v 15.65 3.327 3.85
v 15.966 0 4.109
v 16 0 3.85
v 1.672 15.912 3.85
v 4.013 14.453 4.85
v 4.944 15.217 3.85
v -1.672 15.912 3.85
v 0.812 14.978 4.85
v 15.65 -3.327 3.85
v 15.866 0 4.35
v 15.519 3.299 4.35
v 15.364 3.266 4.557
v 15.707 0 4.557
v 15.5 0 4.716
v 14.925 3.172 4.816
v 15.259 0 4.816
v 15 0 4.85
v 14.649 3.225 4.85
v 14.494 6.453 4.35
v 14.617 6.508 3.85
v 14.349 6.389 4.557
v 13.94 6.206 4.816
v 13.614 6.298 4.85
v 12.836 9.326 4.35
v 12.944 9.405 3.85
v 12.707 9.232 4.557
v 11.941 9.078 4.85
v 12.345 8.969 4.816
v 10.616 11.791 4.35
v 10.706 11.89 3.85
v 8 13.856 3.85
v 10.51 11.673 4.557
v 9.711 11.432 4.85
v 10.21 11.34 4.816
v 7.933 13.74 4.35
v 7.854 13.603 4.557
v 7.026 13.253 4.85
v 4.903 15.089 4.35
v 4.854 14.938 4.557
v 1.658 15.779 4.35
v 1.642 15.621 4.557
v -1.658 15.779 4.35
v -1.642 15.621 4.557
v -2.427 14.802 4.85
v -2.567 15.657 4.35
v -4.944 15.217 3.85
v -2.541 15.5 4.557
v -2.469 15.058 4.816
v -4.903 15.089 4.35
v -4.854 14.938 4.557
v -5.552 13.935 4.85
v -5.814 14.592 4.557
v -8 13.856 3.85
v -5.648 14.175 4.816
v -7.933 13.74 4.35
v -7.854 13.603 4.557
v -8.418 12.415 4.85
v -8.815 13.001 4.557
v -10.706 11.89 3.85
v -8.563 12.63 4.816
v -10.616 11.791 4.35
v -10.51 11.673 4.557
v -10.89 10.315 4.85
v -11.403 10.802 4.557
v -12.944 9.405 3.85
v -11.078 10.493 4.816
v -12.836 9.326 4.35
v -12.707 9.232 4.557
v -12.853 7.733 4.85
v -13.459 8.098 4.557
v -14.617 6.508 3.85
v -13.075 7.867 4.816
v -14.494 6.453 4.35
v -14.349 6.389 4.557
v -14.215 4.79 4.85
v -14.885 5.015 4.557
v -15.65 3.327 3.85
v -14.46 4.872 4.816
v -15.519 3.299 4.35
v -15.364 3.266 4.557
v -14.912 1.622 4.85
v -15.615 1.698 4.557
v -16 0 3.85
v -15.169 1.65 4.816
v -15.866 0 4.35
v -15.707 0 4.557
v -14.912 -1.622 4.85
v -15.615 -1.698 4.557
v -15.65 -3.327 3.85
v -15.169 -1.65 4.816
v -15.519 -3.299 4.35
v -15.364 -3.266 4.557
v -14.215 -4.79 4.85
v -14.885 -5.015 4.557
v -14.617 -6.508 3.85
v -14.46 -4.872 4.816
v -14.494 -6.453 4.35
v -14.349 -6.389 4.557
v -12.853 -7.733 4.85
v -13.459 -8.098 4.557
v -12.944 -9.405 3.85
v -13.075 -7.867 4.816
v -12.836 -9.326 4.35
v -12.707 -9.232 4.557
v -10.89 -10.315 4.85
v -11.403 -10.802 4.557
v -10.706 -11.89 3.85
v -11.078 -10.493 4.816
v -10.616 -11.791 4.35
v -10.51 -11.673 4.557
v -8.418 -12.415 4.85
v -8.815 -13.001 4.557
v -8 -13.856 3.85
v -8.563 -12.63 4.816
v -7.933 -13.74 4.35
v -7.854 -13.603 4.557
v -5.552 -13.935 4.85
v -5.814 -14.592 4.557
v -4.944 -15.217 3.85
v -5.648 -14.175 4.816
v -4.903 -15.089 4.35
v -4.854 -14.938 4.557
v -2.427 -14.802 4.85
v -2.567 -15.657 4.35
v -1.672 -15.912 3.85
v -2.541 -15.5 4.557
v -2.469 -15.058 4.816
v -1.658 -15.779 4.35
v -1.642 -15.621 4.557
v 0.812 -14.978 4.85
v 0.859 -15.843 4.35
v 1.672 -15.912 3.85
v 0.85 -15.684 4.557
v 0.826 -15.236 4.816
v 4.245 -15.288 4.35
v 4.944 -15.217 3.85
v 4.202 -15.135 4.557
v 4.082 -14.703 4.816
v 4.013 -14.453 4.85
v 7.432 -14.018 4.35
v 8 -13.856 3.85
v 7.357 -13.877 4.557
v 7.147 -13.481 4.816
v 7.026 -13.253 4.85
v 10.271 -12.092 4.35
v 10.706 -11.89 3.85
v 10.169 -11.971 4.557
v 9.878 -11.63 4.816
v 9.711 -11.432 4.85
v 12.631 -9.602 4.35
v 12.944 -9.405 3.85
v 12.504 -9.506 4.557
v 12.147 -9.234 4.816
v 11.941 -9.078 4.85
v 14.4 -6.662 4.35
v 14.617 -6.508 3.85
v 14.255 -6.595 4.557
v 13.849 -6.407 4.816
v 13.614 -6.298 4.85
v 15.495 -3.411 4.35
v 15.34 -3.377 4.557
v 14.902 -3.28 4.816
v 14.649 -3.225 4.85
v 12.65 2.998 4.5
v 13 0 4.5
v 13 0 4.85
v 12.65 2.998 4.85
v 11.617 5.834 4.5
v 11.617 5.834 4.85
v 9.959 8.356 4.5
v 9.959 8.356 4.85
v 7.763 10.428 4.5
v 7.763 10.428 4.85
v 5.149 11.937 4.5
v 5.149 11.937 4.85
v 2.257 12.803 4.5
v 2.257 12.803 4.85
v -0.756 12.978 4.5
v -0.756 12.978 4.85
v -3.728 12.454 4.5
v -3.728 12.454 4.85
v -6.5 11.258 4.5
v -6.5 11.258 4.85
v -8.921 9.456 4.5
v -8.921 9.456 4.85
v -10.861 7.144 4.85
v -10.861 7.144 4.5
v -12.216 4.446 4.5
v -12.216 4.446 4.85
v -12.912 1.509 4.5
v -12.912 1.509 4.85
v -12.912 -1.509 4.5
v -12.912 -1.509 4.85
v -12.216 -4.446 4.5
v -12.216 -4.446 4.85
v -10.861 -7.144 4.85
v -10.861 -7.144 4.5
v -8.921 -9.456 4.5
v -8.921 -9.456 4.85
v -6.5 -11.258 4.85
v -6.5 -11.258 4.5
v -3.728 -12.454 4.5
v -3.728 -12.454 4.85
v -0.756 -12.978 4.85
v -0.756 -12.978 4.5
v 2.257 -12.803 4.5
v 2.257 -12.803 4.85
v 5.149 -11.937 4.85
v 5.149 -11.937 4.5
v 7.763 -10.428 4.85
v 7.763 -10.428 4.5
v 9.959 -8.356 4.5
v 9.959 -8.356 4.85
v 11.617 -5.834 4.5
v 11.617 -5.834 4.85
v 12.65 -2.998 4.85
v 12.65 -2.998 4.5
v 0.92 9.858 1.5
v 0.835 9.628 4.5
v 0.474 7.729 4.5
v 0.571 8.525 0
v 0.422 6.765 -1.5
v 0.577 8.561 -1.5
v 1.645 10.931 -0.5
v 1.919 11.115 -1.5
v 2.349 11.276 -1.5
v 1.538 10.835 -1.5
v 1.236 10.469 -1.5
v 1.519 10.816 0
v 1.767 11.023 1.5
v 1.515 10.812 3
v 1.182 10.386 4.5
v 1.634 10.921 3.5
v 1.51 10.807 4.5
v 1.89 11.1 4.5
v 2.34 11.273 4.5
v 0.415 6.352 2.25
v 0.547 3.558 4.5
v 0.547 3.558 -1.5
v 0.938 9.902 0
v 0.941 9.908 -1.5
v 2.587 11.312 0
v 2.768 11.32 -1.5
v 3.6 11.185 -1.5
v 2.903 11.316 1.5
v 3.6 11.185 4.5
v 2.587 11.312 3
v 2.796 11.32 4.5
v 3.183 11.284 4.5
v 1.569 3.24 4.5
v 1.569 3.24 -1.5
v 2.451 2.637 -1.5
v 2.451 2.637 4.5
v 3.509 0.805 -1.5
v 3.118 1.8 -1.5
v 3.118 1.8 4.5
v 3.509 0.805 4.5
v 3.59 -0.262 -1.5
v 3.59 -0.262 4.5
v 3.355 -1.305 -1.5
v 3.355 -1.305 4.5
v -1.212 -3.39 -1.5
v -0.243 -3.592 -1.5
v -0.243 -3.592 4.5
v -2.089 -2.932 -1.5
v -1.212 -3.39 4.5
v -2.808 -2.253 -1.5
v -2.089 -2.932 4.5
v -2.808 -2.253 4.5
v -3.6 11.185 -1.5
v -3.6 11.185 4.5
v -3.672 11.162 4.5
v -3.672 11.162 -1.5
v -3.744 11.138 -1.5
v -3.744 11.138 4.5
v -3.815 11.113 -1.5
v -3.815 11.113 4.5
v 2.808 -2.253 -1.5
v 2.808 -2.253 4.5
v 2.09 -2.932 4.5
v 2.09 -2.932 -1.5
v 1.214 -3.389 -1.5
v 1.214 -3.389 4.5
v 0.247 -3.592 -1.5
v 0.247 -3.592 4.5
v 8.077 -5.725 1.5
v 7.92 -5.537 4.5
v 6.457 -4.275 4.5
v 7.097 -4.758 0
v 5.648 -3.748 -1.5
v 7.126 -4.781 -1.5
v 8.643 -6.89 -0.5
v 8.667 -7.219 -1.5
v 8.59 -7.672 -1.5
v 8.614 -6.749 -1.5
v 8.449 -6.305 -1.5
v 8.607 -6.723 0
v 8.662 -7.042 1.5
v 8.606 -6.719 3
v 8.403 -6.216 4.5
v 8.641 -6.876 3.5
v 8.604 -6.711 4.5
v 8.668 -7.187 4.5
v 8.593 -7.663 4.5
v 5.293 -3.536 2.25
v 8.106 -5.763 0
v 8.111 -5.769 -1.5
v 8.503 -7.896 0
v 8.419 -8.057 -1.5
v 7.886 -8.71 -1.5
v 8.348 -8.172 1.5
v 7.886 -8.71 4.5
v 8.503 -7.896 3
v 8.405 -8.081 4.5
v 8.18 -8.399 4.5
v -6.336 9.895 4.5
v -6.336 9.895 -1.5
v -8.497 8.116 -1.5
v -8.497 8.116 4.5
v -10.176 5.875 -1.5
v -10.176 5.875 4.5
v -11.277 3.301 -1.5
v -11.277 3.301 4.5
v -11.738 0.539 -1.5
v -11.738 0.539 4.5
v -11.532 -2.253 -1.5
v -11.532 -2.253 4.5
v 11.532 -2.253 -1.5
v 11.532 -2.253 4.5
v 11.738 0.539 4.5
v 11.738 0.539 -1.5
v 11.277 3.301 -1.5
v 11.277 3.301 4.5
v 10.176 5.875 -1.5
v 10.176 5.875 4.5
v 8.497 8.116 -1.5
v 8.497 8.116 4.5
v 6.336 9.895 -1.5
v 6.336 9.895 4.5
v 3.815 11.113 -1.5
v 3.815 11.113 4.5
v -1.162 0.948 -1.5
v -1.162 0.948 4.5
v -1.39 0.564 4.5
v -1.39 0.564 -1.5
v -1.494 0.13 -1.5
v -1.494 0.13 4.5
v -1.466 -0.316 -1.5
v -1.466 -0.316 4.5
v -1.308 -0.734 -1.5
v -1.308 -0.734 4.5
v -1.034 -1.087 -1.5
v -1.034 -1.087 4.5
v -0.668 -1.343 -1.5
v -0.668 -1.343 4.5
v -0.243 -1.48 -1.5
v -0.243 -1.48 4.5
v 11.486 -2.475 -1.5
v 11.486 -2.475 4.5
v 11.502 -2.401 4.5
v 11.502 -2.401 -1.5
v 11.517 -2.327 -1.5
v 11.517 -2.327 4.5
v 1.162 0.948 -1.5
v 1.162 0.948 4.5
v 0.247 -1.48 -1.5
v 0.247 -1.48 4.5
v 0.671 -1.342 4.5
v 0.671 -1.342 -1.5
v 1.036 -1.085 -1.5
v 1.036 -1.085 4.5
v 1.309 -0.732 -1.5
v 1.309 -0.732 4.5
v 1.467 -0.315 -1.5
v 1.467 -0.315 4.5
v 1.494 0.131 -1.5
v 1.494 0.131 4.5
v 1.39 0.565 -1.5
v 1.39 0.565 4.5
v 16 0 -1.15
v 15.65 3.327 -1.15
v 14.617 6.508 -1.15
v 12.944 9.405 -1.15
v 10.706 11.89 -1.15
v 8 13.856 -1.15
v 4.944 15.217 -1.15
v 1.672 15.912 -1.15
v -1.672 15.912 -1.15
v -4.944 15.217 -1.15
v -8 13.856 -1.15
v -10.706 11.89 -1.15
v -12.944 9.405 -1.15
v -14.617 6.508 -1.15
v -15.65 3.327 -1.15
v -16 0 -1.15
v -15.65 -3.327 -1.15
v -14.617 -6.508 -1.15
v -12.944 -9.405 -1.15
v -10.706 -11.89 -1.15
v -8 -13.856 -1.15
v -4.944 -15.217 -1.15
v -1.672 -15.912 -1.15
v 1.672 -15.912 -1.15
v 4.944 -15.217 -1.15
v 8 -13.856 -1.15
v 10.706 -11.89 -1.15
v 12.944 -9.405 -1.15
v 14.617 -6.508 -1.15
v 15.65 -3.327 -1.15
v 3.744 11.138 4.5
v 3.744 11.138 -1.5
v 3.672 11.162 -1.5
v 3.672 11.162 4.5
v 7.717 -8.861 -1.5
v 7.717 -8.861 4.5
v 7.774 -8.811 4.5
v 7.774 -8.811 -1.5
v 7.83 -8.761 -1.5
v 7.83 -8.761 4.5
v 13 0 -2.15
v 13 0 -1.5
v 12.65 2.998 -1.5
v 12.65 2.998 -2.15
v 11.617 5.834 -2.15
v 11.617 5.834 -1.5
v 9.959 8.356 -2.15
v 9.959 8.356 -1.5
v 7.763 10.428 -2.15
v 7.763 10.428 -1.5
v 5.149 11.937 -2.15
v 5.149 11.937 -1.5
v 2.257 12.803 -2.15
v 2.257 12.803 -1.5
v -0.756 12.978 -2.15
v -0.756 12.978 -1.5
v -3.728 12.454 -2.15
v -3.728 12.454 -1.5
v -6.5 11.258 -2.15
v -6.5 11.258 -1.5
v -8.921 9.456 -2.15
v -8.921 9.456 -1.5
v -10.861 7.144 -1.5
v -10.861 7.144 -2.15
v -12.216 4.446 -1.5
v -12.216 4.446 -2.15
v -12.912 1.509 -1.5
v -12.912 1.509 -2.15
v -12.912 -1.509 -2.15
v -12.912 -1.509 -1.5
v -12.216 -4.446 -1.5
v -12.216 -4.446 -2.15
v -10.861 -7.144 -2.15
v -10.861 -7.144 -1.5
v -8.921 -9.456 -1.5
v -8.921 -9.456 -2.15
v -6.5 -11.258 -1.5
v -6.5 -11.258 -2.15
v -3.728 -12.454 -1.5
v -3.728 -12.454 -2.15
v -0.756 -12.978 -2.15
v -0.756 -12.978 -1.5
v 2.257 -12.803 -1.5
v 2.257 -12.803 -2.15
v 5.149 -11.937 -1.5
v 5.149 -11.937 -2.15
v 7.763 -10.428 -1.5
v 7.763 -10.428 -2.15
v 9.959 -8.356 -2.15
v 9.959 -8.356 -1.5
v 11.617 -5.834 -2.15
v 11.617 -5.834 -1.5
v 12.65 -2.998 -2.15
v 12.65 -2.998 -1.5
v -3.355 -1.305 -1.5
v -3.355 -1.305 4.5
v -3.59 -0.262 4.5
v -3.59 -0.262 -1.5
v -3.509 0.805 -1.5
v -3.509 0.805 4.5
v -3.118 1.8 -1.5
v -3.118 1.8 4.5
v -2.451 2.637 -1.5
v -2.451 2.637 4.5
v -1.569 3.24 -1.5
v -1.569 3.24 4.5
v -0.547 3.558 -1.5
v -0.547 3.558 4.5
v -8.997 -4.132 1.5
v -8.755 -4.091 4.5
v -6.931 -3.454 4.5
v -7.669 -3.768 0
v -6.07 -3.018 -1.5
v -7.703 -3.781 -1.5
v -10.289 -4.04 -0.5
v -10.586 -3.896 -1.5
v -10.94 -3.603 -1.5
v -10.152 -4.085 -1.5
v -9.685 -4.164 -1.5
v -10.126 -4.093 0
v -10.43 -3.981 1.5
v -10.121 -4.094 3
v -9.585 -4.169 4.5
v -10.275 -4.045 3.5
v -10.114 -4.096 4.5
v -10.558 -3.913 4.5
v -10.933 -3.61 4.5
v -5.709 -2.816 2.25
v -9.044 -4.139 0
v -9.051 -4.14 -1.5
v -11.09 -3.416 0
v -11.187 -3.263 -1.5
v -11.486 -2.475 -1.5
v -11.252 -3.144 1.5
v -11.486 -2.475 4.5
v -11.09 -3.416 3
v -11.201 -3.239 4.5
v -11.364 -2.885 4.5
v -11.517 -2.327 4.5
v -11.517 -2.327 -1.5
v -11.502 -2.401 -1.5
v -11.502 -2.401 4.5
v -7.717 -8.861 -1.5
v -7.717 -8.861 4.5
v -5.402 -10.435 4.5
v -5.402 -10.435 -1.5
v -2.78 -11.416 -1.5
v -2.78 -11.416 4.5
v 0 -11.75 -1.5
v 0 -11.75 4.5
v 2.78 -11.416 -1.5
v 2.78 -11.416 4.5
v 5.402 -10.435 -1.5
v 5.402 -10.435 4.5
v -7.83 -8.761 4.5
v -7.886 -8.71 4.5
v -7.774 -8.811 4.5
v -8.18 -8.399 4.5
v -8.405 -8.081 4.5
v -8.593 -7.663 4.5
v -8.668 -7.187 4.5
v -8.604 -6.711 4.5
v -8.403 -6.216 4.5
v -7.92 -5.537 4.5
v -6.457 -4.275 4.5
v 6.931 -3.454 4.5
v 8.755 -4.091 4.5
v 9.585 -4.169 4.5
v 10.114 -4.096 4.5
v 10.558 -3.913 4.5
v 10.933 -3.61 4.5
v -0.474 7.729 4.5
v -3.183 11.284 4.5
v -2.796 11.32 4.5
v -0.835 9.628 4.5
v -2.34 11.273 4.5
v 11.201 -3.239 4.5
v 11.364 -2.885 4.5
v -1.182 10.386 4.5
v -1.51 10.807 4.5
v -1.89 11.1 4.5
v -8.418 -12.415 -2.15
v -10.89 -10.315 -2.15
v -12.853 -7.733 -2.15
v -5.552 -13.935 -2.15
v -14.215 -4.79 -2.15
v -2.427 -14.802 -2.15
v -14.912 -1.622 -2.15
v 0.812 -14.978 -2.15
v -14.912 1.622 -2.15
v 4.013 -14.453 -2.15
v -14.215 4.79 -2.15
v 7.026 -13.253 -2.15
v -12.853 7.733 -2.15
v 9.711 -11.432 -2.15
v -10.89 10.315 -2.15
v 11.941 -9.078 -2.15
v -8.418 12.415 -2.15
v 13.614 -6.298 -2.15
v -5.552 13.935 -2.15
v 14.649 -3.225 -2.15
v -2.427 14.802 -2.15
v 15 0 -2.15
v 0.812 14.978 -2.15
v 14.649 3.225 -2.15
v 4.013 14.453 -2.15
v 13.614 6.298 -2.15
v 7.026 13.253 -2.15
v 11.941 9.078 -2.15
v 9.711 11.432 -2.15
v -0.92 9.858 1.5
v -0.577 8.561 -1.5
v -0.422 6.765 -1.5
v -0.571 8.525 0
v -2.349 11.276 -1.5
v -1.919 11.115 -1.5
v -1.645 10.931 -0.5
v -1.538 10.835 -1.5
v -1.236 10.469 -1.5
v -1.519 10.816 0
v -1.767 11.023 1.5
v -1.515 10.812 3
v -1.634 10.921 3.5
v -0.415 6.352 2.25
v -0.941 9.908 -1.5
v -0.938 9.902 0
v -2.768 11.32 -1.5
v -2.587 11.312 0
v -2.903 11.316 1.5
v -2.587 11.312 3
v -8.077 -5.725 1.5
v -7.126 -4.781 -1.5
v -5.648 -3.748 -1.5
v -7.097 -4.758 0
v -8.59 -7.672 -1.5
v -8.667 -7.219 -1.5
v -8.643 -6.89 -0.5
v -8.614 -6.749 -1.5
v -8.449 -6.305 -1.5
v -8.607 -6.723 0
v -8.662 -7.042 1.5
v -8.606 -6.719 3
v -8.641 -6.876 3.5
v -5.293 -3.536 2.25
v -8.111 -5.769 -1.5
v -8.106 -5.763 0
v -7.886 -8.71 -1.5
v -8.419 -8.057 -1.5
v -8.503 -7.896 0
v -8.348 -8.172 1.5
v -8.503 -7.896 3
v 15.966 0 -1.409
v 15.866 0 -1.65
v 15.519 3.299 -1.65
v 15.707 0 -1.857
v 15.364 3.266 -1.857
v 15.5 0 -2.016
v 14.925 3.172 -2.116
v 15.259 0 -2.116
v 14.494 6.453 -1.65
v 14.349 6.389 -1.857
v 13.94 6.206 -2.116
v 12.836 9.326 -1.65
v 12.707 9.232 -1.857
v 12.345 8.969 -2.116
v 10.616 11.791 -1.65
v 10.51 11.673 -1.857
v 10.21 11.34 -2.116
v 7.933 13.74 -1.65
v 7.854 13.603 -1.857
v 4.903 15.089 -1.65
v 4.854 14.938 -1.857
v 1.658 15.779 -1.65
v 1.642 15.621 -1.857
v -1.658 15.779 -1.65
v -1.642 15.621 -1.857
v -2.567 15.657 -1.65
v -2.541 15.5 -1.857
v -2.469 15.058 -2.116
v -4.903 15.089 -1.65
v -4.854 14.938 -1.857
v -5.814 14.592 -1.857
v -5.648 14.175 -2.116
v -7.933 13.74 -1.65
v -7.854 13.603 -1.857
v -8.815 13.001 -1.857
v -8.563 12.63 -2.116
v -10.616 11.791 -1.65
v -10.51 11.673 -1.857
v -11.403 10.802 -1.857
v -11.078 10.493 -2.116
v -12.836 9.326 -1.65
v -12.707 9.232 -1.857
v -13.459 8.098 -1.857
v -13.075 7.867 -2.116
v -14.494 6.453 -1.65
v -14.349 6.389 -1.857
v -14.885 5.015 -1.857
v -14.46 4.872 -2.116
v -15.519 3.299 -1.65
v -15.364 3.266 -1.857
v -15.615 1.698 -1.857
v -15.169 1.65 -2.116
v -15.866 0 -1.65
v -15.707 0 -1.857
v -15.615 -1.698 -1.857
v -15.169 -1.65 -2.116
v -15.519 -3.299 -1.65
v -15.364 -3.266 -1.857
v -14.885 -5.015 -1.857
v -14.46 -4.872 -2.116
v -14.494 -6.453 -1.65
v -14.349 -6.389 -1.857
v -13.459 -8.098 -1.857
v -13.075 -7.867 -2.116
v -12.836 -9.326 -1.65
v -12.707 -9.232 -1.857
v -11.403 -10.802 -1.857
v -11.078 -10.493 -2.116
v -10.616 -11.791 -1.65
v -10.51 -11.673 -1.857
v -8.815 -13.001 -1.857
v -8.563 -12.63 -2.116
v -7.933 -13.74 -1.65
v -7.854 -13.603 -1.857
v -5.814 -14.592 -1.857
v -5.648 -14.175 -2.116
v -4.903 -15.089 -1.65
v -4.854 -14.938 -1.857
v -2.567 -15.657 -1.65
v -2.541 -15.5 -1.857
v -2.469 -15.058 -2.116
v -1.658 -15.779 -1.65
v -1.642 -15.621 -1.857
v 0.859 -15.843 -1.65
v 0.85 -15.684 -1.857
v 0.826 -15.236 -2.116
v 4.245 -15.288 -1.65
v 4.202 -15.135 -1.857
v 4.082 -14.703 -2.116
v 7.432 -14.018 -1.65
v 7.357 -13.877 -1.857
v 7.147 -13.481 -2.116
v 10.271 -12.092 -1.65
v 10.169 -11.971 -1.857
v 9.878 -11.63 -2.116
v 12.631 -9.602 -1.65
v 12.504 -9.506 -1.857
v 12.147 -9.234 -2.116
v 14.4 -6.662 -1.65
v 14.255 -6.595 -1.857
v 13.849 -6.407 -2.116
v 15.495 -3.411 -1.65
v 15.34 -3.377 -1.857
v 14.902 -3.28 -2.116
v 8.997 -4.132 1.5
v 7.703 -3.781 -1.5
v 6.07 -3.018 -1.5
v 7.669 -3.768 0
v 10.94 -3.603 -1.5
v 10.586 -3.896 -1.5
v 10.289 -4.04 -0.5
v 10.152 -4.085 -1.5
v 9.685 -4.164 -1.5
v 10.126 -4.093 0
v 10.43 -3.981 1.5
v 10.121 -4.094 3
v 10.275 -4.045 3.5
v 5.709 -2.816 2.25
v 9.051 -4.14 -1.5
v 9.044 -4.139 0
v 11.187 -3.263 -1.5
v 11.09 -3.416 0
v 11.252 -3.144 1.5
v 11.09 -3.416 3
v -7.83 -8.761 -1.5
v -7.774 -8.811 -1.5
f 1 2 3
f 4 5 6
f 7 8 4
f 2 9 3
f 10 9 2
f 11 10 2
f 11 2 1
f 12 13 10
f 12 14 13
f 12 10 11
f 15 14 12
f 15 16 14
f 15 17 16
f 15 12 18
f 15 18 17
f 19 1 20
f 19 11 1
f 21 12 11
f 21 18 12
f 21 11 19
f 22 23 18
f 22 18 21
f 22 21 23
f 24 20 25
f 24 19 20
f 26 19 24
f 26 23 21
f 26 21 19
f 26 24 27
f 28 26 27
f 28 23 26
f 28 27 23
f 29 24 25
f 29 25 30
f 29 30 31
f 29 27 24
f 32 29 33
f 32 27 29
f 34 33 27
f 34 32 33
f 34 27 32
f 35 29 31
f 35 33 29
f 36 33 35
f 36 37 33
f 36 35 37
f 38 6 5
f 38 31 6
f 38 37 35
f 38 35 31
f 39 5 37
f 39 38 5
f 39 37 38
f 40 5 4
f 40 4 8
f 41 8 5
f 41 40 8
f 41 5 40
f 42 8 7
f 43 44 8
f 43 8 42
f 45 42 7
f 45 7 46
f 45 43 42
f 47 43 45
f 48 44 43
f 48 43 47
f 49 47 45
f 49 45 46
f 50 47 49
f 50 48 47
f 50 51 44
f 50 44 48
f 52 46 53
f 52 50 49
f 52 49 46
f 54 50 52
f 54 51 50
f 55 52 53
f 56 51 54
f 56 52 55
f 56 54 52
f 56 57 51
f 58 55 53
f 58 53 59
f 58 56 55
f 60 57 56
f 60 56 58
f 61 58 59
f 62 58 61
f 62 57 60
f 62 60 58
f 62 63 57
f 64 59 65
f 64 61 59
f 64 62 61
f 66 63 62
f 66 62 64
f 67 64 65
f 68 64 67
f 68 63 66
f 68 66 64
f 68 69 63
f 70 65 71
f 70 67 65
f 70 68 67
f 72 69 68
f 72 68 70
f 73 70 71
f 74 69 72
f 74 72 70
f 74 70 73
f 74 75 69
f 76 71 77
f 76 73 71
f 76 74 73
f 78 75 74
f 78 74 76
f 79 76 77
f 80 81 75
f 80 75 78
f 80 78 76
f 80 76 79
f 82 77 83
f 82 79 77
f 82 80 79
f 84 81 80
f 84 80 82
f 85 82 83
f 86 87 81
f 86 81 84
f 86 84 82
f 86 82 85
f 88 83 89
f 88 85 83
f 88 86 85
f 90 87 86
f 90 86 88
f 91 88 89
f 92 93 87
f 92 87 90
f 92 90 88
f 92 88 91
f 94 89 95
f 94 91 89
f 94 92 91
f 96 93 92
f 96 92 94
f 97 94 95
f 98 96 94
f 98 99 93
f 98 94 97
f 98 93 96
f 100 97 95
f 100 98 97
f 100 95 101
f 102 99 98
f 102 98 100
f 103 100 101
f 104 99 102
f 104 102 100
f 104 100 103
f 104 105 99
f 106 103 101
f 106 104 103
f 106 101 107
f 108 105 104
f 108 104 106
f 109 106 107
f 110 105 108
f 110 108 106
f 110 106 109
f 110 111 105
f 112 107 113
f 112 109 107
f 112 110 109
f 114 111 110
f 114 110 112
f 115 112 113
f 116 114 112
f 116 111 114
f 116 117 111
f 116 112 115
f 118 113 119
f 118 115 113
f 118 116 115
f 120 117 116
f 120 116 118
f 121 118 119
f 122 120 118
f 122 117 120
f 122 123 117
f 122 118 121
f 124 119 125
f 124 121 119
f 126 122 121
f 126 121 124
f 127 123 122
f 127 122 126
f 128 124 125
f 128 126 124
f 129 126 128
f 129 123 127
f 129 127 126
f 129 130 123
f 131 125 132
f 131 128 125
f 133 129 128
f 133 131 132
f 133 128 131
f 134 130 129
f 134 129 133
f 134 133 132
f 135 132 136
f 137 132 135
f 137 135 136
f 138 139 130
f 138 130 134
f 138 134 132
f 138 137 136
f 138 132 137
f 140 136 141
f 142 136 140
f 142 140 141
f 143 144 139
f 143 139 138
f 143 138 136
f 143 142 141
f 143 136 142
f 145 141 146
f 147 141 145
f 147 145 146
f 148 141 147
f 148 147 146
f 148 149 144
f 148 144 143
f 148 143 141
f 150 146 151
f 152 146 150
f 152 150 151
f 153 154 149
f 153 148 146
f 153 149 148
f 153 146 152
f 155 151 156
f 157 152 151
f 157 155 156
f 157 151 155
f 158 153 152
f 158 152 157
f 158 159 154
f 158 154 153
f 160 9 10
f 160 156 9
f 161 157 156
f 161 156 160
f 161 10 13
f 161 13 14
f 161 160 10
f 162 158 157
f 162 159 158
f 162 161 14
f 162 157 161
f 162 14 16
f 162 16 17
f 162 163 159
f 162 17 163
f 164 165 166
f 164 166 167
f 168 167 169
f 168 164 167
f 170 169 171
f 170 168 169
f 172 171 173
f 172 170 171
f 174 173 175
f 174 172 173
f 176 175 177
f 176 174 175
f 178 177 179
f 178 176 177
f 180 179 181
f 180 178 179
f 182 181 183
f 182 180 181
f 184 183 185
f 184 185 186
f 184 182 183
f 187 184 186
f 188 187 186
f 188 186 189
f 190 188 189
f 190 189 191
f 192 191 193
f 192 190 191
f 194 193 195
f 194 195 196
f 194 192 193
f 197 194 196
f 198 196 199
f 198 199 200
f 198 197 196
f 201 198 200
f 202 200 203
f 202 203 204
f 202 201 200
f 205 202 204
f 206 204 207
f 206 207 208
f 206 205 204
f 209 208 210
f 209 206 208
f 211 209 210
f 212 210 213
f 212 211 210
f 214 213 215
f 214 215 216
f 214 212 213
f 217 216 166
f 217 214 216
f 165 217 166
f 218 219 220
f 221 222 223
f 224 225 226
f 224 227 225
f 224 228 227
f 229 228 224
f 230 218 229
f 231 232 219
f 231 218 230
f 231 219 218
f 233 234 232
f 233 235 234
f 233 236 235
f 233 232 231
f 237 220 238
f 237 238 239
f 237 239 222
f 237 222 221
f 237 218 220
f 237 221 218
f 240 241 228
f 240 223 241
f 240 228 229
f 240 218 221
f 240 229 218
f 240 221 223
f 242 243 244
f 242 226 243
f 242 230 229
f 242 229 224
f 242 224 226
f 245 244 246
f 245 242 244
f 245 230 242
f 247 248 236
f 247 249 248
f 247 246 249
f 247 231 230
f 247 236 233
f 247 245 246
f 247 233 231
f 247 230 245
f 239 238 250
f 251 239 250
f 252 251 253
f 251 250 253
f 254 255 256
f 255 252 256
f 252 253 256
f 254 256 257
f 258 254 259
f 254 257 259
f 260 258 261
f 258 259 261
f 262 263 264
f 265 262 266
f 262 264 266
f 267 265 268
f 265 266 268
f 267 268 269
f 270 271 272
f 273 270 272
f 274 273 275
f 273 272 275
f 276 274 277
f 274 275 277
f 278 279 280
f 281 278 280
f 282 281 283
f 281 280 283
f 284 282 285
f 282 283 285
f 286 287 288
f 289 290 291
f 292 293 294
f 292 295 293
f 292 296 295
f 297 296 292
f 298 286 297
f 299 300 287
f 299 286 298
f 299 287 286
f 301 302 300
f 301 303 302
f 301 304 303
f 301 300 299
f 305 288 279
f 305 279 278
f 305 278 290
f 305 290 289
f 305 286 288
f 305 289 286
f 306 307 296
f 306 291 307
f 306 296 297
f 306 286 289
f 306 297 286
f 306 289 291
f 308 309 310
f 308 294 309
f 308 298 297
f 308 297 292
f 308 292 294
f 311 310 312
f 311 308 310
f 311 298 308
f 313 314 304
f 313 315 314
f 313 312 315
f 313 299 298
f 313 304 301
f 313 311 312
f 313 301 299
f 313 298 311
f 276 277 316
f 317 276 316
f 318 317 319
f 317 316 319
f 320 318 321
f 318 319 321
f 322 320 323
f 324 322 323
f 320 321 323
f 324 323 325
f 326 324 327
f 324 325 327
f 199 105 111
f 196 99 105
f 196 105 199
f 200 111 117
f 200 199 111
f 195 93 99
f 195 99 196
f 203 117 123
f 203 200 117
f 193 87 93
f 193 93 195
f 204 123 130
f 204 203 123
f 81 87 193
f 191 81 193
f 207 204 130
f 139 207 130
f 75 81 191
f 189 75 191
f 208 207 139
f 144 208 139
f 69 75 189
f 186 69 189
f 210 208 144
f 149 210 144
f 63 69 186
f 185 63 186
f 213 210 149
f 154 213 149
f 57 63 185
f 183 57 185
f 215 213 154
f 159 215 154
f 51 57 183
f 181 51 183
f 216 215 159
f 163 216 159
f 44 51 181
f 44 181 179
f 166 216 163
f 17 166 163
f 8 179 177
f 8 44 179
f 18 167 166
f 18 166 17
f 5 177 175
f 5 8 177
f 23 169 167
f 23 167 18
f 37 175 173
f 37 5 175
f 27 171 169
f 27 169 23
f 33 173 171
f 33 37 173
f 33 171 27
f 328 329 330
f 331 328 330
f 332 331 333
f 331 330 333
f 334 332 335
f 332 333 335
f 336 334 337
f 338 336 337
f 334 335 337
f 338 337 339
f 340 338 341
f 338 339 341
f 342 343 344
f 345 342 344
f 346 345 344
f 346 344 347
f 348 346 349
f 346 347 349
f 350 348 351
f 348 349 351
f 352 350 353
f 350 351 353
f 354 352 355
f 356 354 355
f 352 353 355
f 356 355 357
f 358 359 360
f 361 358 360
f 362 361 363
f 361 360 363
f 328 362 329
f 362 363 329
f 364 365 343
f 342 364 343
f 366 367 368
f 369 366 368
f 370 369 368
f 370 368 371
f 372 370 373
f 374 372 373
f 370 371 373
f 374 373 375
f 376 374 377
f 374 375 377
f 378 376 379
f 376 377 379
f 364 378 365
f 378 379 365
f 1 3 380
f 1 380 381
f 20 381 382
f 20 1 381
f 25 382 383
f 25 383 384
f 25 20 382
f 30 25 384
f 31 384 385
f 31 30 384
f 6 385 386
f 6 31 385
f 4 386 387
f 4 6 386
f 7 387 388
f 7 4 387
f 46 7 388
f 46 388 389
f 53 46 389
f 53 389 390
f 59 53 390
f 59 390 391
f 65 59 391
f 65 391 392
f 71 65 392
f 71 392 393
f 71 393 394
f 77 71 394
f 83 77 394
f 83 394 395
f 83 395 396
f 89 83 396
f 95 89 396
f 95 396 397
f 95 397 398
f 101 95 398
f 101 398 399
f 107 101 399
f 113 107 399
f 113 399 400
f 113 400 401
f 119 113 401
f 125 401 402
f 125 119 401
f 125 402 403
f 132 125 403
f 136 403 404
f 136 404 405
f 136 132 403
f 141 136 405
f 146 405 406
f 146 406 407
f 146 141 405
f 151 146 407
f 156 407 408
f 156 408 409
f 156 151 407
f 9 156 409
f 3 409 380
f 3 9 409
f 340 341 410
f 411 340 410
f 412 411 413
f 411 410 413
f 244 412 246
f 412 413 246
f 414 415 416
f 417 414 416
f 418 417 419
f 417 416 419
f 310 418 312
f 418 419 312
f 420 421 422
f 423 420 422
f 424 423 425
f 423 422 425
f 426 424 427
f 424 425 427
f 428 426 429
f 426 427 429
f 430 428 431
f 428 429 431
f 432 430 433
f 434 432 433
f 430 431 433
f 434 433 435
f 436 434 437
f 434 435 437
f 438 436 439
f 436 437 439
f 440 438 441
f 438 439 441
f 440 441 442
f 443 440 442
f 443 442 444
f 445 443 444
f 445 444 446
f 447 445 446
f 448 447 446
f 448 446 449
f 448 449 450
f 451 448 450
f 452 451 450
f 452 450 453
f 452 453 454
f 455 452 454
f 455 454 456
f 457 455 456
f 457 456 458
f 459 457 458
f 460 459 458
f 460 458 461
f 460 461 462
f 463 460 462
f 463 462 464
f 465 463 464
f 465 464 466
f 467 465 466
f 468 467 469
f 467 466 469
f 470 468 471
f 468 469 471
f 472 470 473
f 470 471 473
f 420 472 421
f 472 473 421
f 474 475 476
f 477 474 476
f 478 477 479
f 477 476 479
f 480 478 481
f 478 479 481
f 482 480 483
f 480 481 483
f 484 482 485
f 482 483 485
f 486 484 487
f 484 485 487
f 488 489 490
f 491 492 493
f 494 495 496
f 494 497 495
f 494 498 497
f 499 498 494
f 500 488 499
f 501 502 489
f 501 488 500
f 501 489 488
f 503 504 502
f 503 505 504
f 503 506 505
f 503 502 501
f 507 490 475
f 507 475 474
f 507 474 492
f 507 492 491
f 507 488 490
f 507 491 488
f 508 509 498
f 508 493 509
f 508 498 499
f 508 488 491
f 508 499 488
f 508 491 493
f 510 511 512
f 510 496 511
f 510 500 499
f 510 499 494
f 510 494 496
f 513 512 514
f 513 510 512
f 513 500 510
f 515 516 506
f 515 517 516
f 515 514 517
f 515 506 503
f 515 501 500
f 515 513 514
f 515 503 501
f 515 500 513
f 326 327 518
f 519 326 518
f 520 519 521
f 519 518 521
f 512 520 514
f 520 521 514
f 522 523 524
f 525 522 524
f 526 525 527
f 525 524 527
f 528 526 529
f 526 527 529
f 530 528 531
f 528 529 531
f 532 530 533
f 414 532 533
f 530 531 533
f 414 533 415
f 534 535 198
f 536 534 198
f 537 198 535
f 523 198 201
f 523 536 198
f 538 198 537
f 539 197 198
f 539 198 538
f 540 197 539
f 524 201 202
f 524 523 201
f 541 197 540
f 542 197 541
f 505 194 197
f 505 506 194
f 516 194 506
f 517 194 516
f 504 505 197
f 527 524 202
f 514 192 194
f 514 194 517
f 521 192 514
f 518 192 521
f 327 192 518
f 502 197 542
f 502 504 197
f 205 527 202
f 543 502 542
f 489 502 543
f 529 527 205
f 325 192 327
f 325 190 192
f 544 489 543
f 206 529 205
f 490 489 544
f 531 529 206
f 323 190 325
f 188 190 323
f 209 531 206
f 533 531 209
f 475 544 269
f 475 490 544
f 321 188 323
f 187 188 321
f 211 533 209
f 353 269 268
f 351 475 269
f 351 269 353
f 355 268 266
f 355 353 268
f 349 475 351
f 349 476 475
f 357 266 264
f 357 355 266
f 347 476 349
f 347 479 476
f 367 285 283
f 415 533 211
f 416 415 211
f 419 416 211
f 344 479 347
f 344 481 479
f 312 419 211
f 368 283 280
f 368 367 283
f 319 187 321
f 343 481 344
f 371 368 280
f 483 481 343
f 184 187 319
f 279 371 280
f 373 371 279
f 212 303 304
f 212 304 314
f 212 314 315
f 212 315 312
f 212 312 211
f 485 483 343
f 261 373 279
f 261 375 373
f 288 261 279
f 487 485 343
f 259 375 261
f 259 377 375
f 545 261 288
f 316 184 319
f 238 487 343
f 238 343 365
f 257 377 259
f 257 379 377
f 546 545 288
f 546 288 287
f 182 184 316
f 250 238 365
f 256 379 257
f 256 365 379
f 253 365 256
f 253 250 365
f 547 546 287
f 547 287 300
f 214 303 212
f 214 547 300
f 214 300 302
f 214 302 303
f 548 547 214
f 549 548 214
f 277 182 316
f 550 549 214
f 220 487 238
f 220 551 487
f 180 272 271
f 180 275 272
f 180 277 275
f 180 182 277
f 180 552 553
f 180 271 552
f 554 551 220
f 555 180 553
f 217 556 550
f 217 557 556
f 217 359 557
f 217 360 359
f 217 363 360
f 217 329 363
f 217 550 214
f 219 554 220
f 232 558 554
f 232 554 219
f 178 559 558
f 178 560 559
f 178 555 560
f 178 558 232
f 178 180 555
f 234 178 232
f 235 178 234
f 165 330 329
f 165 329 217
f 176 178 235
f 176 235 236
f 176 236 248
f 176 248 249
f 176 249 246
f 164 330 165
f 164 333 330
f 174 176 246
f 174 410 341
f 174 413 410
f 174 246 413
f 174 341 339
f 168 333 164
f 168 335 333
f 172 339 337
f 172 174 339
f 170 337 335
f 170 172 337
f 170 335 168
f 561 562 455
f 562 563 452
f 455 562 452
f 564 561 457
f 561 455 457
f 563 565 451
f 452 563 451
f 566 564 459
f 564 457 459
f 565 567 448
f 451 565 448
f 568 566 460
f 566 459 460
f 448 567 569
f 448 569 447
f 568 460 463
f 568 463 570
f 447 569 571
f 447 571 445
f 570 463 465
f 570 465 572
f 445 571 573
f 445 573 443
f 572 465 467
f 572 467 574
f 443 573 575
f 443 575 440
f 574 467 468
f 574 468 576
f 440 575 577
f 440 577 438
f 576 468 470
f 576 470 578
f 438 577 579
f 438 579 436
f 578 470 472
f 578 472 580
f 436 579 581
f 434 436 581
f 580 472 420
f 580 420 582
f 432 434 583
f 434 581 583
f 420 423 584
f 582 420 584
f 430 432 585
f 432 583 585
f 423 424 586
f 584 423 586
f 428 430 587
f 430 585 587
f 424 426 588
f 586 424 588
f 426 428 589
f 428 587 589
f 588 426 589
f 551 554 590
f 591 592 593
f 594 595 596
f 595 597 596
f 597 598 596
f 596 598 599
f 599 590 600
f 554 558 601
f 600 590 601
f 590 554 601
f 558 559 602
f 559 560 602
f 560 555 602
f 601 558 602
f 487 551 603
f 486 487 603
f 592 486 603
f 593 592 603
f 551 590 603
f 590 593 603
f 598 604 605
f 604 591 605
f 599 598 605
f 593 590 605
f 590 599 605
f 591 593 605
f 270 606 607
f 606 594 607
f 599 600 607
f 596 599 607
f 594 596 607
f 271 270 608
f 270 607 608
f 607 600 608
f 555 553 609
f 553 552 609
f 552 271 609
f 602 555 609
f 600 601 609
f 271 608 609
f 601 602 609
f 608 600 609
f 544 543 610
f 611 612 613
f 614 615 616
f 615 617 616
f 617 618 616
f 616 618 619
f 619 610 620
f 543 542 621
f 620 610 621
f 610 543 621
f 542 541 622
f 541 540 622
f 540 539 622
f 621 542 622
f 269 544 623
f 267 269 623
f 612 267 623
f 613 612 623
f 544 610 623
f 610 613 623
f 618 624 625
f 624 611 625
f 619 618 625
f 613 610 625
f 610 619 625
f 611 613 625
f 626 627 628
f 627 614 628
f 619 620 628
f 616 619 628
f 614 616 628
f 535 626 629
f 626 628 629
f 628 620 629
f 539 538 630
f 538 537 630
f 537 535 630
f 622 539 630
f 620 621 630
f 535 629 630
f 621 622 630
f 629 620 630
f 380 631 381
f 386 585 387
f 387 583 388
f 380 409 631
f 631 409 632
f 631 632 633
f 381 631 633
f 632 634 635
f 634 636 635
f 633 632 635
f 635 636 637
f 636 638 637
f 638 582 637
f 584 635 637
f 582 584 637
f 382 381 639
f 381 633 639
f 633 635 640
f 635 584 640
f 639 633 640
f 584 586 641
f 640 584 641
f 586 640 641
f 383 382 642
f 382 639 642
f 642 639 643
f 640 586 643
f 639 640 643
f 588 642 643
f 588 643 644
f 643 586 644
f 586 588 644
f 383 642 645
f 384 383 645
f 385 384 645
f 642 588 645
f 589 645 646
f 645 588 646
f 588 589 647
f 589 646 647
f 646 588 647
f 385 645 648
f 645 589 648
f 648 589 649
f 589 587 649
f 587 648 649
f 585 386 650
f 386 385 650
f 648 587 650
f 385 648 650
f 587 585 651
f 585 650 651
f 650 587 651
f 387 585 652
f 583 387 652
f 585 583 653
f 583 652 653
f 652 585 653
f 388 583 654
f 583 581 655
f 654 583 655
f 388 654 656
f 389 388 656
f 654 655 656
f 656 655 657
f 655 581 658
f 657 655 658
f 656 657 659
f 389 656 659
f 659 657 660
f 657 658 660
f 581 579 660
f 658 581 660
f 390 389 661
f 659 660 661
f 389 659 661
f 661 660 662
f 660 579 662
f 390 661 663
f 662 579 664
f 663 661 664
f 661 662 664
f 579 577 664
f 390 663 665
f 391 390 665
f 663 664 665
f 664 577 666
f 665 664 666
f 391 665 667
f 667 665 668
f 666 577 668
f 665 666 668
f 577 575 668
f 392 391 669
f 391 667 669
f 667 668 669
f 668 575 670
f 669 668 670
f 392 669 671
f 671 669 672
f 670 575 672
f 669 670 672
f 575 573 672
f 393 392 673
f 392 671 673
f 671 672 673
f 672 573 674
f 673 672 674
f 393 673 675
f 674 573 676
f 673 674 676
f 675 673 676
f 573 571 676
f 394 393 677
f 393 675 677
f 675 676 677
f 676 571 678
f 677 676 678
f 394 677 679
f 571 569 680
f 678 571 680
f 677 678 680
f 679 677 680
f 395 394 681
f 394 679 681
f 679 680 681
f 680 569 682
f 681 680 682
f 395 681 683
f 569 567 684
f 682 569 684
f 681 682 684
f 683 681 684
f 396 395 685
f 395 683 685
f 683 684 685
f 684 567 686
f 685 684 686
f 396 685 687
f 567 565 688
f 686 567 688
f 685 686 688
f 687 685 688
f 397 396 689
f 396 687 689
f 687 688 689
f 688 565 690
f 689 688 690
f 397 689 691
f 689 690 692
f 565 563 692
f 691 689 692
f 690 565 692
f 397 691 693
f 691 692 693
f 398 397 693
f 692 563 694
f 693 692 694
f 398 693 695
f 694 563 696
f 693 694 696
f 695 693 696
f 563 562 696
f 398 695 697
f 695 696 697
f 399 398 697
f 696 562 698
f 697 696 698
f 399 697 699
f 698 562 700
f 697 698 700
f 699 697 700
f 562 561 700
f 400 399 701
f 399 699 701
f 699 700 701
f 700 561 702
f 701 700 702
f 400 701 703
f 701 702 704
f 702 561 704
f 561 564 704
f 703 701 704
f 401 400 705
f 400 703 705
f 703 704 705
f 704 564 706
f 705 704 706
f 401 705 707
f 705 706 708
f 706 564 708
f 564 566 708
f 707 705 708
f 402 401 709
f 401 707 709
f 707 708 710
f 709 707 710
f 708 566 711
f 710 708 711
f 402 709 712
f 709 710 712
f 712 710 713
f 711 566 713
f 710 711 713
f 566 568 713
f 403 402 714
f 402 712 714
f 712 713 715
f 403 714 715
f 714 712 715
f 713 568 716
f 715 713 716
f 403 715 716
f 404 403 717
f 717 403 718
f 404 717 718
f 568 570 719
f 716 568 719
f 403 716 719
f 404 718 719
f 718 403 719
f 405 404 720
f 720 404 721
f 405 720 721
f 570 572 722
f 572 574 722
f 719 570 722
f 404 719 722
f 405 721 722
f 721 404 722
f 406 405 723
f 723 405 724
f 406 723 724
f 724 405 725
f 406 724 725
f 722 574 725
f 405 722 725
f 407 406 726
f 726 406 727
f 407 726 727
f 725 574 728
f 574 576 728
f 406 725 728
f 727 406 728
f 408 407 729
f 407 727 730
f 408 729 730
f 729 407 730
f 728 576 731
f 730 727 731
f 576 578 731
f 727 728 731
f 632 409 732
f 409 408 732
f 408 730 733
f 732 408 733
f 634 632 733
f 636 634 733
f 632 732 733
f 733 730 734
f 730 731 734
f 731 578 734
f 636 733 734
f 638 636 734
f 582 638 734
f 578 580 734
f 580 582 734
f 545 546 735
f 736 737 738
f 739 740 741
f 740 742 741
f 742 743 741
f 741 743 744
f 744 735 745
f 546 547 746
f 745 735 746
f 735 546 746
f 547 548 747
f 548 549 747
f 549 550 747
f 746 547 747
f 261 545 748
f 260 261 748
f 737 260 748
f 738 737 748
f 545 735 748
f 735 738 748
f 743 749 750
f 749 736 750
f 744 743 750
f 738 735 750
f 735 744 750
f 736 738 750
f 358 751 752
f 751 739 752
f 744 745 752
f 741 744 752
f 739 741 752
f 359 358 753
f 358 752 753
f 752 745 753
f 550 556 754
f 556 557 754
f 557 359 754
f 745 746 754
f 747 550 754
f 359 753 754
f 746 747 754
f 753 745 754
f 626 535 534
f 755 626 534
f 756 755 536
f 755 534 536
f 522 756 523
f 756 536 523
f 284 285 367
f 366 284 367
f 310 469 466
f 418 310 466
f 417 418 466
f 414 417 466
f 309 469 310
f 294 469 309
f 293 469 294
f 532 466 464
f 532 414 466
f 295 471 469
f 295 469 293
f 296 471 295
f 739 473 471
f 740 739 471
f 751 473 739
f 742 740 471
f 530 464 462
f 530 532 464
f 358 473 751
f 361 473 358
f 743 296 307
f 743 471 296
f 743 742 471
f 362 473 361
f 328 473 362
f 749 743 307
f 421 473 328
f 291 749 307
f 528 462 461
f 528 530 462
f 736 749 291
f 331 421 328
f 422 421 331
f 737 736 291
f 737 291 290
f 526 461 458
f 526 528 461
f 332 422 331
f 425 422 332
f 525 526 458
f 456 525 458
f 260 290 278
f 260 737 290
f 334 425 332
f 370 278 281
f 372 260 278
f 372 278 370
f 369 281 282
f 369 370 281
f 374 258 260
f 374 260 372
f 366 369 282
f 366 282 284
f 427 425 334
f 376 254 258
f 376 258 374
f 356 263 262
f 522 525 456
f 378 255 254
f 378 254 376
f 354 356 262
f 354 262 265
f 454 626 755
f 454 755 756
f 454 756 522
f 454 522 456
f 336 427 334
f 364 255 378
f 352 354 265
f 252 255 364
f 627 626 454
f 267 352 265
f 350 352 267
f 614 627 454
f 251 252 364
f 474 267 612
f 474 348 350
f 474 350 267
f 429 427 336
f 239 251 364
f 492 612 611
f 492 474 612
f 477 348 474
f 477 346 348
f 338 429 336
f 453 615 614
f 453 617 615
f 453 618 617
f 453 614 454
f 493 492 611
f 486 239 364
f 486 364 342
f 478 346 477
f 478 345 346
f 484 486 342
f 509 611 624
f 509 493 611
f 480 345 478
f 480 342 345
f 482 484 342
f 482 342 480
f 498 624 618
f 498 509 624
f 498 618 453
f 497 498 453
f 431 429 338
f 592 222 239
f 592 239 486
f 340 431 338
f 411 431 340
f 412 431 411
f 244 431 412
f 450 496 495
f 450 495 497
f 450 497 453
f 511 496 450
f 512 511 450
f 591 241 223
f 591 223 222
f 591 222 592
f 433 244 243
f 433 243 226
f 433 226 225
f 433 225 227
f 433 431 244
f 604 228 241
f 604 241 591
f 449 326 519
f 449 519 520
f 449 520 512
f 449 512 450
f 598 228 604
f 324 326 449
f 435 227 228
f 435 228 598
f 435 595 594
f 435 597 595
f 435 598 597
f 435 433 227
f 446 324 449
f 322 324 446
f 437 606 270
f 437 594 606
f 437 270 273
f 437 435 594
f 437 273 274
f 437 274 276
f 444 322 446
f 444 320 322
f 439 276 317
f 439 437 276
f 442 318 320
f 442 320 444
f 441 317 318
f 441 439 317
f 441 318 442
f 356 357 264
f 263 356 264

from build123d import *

# Parameters (mm, degrees)
IZIM1_R                          = 14.3
Y_KSEKLIK_EKSTR_ZYON2_DEPTH      = 3
IZIM2_R                          = 13
Y_KSEKLIK_EKSTR_ZYON3_DEPTH      = 1.5
IZIM3_R                          = 13
Y_KSEKLIK_EKSTR_ZYON4_DEPTH      = 1.5
KES_EKSTR_ZYON1_DEPTH            = 7
KES_EKSTR_ZYON3_DEPTH            = 7
IZIM6_R                          = 16
IZIM6_R_2                        = 13
Y_KSEKLIK_EKSTR_ZYON5_DEPTH      = 0.35
Y_KSEKLIK_EKSTR_ZYON5_DEPTH_BACK = 6.65
RADYUS1_R                        = 1
RADYUS2_R                        = 1


with BuildPart() as part:
    # Çizim1 → Yükseklik-Ekstrüzyon2 (new body)
    with BuildSketch(Plane.XY):
        Circle(IZIM1_R)
    extrude(amount=Y_KSEKLIK_EKSTR_ZYON2_DEPTH)

    # Çizim2 → Yükseklik-Ekstrüzyon3 (add)
    with BuildSketch(Plane.XY.offset(3)):
        Circle(IZIM2_R)
    extrude(amount=Y_KSEKLIK_EKSTR_ZYON3_DEPTH)

    # Çizim3 → Yükseklik-Ekstrüzyon4 (add)
    with BuildSketch(Plane(origin=(0, 0, 0), x_dir=(-1, 0, 0), z_dir=(0, 0, -1))):
        Circle(IZIM3_R)
    extrude(amount=Y_KSEKLIK_EKSTR_ZYON4_DEPTH)

    # Çizim4 → Kes-Ekstrüzyon1 (cut)
    with BuildSketch(Plane.XY.offset(4.5)):
        with BuildLine():
            add(Edge.make_bspline(
                [(-0.547346557, 3.558147235), (0.233958313, 12.343828963), (-3.6, 11.184922888)],
                knots=[0, 0, 0, 0.973142828, 0.973142828, 0.973142828], degree=2))
            ThreePointArc((-3.6, 11.184922888), (-3.707741279, 11.149670605), (-3.81513744, 11.113380508))
            ThreePointArc((-3.81513744, 11.113380508), (-10.175798494, 5.875), (-11.532038562, -2.252684312))
            ThreePointArc((-11.532038562, -2.252684312), (-11.509768628, -2.363837165), (-11.48642736, -2.47476999))
            add(Edge.make_bspline(
                [(-3.355119175, -1.305057594), (-10.573090305, -6.374528324), (-11.48642736, -2.47476999)],
                knots=[0, 0, 0, 0.973142828, 0.973142828, 0.973142828], degree=2))
            ThreePointArc((-3.355119175, -1.305057594), (-3.117691454, 1.8), (-0.547346557, 3.558147235))
        make_face()
        with BuildLine():
            add(Edge.make_bspline(
                [(3.355119175, -1.305057594), (10.573090305, -6.374528324), (11.48642736, -2.47476999)],
                knots=[0, 0, 0, 0.973142828, 0.973142828, 0.973142828], degree=2))
            ThreePointArc((11.48642736, -2.47476999), (11.509768628, -2.363837165), (11.532038562, -2.252684312))
            ThreePointArc((11.532038562, -2.252684312), (10.175798494, 5.875), (3.81513744, 11.113380508))
            ThreePointArc((3.81513744, 11.113380508), (3.707741279, 11.149670605), (3.6, 11.184922888))
            add(Edge.make_bspline(
                [(0.547346557, 3.558147235), (-0.233958313, 12.343828963), (3.6, 11.184922888)],
                knots=[0, 0, 0, 0.973142828, 0.973142828, 0.973142828], degree=2))
            ThreePointArc((0.547346557, 3.558147235), (3.117691454, 1.8), (3.355119175, -1.305057594))
        make_face()
        with BuildLine():
            add(Edge.make_bspline(
                [(-2.807772617, -2.253089641), (-10.807048618, -5.969300639), (-7.88642736, -8.710152897)],
                knots=[0, 0, 0, 0.973142828, 0.973142828, 0.973142828], degree=2))
            ThreePointArc((-7.88642736, -8.710152897), (-7.802027349, -8.785833441), (-7.716901122, -8.860696196))
            ThreePointArc((-7.716901122, -8.860696196), (0, -11.75), (7.716901122, -8.860696196))
            ThreePointArc((7.716901122, -8.860696196), (7.802027349, -8.785833441), (7.88642736, -8.710152897))
            add(Edge.make_bspline(
                [(2.807772617, -2.253089641), (10.807048618, -5.969300639), (7.88642736, -8.710152897)],
                knots=[0, 0, 0, 0.973142828, 0.973142828, 0.973142828], degree=2))
            ThreePointArc((2.807772617, -2.253089641), (0, -3.6), (-2.807772617, -2.253089641))
        make_face()
    extrude(amount=-KES_EKSTR_ZYON1_DEPTH, mode=Mode.SUBTRACT)

    # Çizim5 → Kes-Ekstrüzyon3 (cut)
    with BuildSketch(Plane.XY.offset(4.5)):
        with BuildLine():
            Line((-0.243283358, -3.591770205), (-0.243283358, -3.70476627))
            Line((-0.243283358, -3.70476627), (0.246794301, -3.70476627))
            Line((0.246794301, -3.70476627), (0.246794301, -3.591770205))
            Line((0.246794301, -3.591770205), (0.246794301, -1.479558236))
            ThreePointArc((0.246794301, -1.479558236), (1.403567335, -0.529149068), (1.162136883, 0.948386981))
            Line((1.162136883, 0.948386981), (-1.162136883, 0.948386981))
            ThreePointArc((-1.162136883, 0.948386981), (-1.402938645, -0.530813677), (-0.243283358, -1.480139591))
            Line((-0.243283358, -1.480139591), (-0.243283358, -3.591770205))
        make_face()
    extrude(amount=-KES_EKSTR_ZYON3_DEPTH, mode=Mode.SUBTRACT)

    # Çizim6 → Yükseklik-Ekstrüzyon5 (add, two sides)
    with BuildSketch(Plane.XY.offset(4.5)) as y_kseklik_ekstr_zyon5_sk:
        Circle(IZIM6_R)
        Circle(IZIM6_R_2, mode=Mode.SUBTRACT)
    extrude(amount=Y_KSEKLIK_EKSTR_ZYON5_DEPTH)
    extrude(y_kseklik_ekstr_zyon5_sk.sketch, amount=-Y_KSEKLIK_EKSTR_ZYON5_DEPTH_BACK)

    # Radyus1
    radyus1_edges = [part.edges().sort_by_distance(p)[0] for p in [
        (-16, 0, 4.85),
    ]]
    fillet(radyus1_edges, radius=RADYUS1_R)

    # Radyus2
    radyus2_edges = [part.edges().sort_by_distance(p)[0] for p in [
        (-16, 0, -2.15),
    ]]
    fillet(radyus2_edges, radius=RADYUS2_R)


solid = part.part
